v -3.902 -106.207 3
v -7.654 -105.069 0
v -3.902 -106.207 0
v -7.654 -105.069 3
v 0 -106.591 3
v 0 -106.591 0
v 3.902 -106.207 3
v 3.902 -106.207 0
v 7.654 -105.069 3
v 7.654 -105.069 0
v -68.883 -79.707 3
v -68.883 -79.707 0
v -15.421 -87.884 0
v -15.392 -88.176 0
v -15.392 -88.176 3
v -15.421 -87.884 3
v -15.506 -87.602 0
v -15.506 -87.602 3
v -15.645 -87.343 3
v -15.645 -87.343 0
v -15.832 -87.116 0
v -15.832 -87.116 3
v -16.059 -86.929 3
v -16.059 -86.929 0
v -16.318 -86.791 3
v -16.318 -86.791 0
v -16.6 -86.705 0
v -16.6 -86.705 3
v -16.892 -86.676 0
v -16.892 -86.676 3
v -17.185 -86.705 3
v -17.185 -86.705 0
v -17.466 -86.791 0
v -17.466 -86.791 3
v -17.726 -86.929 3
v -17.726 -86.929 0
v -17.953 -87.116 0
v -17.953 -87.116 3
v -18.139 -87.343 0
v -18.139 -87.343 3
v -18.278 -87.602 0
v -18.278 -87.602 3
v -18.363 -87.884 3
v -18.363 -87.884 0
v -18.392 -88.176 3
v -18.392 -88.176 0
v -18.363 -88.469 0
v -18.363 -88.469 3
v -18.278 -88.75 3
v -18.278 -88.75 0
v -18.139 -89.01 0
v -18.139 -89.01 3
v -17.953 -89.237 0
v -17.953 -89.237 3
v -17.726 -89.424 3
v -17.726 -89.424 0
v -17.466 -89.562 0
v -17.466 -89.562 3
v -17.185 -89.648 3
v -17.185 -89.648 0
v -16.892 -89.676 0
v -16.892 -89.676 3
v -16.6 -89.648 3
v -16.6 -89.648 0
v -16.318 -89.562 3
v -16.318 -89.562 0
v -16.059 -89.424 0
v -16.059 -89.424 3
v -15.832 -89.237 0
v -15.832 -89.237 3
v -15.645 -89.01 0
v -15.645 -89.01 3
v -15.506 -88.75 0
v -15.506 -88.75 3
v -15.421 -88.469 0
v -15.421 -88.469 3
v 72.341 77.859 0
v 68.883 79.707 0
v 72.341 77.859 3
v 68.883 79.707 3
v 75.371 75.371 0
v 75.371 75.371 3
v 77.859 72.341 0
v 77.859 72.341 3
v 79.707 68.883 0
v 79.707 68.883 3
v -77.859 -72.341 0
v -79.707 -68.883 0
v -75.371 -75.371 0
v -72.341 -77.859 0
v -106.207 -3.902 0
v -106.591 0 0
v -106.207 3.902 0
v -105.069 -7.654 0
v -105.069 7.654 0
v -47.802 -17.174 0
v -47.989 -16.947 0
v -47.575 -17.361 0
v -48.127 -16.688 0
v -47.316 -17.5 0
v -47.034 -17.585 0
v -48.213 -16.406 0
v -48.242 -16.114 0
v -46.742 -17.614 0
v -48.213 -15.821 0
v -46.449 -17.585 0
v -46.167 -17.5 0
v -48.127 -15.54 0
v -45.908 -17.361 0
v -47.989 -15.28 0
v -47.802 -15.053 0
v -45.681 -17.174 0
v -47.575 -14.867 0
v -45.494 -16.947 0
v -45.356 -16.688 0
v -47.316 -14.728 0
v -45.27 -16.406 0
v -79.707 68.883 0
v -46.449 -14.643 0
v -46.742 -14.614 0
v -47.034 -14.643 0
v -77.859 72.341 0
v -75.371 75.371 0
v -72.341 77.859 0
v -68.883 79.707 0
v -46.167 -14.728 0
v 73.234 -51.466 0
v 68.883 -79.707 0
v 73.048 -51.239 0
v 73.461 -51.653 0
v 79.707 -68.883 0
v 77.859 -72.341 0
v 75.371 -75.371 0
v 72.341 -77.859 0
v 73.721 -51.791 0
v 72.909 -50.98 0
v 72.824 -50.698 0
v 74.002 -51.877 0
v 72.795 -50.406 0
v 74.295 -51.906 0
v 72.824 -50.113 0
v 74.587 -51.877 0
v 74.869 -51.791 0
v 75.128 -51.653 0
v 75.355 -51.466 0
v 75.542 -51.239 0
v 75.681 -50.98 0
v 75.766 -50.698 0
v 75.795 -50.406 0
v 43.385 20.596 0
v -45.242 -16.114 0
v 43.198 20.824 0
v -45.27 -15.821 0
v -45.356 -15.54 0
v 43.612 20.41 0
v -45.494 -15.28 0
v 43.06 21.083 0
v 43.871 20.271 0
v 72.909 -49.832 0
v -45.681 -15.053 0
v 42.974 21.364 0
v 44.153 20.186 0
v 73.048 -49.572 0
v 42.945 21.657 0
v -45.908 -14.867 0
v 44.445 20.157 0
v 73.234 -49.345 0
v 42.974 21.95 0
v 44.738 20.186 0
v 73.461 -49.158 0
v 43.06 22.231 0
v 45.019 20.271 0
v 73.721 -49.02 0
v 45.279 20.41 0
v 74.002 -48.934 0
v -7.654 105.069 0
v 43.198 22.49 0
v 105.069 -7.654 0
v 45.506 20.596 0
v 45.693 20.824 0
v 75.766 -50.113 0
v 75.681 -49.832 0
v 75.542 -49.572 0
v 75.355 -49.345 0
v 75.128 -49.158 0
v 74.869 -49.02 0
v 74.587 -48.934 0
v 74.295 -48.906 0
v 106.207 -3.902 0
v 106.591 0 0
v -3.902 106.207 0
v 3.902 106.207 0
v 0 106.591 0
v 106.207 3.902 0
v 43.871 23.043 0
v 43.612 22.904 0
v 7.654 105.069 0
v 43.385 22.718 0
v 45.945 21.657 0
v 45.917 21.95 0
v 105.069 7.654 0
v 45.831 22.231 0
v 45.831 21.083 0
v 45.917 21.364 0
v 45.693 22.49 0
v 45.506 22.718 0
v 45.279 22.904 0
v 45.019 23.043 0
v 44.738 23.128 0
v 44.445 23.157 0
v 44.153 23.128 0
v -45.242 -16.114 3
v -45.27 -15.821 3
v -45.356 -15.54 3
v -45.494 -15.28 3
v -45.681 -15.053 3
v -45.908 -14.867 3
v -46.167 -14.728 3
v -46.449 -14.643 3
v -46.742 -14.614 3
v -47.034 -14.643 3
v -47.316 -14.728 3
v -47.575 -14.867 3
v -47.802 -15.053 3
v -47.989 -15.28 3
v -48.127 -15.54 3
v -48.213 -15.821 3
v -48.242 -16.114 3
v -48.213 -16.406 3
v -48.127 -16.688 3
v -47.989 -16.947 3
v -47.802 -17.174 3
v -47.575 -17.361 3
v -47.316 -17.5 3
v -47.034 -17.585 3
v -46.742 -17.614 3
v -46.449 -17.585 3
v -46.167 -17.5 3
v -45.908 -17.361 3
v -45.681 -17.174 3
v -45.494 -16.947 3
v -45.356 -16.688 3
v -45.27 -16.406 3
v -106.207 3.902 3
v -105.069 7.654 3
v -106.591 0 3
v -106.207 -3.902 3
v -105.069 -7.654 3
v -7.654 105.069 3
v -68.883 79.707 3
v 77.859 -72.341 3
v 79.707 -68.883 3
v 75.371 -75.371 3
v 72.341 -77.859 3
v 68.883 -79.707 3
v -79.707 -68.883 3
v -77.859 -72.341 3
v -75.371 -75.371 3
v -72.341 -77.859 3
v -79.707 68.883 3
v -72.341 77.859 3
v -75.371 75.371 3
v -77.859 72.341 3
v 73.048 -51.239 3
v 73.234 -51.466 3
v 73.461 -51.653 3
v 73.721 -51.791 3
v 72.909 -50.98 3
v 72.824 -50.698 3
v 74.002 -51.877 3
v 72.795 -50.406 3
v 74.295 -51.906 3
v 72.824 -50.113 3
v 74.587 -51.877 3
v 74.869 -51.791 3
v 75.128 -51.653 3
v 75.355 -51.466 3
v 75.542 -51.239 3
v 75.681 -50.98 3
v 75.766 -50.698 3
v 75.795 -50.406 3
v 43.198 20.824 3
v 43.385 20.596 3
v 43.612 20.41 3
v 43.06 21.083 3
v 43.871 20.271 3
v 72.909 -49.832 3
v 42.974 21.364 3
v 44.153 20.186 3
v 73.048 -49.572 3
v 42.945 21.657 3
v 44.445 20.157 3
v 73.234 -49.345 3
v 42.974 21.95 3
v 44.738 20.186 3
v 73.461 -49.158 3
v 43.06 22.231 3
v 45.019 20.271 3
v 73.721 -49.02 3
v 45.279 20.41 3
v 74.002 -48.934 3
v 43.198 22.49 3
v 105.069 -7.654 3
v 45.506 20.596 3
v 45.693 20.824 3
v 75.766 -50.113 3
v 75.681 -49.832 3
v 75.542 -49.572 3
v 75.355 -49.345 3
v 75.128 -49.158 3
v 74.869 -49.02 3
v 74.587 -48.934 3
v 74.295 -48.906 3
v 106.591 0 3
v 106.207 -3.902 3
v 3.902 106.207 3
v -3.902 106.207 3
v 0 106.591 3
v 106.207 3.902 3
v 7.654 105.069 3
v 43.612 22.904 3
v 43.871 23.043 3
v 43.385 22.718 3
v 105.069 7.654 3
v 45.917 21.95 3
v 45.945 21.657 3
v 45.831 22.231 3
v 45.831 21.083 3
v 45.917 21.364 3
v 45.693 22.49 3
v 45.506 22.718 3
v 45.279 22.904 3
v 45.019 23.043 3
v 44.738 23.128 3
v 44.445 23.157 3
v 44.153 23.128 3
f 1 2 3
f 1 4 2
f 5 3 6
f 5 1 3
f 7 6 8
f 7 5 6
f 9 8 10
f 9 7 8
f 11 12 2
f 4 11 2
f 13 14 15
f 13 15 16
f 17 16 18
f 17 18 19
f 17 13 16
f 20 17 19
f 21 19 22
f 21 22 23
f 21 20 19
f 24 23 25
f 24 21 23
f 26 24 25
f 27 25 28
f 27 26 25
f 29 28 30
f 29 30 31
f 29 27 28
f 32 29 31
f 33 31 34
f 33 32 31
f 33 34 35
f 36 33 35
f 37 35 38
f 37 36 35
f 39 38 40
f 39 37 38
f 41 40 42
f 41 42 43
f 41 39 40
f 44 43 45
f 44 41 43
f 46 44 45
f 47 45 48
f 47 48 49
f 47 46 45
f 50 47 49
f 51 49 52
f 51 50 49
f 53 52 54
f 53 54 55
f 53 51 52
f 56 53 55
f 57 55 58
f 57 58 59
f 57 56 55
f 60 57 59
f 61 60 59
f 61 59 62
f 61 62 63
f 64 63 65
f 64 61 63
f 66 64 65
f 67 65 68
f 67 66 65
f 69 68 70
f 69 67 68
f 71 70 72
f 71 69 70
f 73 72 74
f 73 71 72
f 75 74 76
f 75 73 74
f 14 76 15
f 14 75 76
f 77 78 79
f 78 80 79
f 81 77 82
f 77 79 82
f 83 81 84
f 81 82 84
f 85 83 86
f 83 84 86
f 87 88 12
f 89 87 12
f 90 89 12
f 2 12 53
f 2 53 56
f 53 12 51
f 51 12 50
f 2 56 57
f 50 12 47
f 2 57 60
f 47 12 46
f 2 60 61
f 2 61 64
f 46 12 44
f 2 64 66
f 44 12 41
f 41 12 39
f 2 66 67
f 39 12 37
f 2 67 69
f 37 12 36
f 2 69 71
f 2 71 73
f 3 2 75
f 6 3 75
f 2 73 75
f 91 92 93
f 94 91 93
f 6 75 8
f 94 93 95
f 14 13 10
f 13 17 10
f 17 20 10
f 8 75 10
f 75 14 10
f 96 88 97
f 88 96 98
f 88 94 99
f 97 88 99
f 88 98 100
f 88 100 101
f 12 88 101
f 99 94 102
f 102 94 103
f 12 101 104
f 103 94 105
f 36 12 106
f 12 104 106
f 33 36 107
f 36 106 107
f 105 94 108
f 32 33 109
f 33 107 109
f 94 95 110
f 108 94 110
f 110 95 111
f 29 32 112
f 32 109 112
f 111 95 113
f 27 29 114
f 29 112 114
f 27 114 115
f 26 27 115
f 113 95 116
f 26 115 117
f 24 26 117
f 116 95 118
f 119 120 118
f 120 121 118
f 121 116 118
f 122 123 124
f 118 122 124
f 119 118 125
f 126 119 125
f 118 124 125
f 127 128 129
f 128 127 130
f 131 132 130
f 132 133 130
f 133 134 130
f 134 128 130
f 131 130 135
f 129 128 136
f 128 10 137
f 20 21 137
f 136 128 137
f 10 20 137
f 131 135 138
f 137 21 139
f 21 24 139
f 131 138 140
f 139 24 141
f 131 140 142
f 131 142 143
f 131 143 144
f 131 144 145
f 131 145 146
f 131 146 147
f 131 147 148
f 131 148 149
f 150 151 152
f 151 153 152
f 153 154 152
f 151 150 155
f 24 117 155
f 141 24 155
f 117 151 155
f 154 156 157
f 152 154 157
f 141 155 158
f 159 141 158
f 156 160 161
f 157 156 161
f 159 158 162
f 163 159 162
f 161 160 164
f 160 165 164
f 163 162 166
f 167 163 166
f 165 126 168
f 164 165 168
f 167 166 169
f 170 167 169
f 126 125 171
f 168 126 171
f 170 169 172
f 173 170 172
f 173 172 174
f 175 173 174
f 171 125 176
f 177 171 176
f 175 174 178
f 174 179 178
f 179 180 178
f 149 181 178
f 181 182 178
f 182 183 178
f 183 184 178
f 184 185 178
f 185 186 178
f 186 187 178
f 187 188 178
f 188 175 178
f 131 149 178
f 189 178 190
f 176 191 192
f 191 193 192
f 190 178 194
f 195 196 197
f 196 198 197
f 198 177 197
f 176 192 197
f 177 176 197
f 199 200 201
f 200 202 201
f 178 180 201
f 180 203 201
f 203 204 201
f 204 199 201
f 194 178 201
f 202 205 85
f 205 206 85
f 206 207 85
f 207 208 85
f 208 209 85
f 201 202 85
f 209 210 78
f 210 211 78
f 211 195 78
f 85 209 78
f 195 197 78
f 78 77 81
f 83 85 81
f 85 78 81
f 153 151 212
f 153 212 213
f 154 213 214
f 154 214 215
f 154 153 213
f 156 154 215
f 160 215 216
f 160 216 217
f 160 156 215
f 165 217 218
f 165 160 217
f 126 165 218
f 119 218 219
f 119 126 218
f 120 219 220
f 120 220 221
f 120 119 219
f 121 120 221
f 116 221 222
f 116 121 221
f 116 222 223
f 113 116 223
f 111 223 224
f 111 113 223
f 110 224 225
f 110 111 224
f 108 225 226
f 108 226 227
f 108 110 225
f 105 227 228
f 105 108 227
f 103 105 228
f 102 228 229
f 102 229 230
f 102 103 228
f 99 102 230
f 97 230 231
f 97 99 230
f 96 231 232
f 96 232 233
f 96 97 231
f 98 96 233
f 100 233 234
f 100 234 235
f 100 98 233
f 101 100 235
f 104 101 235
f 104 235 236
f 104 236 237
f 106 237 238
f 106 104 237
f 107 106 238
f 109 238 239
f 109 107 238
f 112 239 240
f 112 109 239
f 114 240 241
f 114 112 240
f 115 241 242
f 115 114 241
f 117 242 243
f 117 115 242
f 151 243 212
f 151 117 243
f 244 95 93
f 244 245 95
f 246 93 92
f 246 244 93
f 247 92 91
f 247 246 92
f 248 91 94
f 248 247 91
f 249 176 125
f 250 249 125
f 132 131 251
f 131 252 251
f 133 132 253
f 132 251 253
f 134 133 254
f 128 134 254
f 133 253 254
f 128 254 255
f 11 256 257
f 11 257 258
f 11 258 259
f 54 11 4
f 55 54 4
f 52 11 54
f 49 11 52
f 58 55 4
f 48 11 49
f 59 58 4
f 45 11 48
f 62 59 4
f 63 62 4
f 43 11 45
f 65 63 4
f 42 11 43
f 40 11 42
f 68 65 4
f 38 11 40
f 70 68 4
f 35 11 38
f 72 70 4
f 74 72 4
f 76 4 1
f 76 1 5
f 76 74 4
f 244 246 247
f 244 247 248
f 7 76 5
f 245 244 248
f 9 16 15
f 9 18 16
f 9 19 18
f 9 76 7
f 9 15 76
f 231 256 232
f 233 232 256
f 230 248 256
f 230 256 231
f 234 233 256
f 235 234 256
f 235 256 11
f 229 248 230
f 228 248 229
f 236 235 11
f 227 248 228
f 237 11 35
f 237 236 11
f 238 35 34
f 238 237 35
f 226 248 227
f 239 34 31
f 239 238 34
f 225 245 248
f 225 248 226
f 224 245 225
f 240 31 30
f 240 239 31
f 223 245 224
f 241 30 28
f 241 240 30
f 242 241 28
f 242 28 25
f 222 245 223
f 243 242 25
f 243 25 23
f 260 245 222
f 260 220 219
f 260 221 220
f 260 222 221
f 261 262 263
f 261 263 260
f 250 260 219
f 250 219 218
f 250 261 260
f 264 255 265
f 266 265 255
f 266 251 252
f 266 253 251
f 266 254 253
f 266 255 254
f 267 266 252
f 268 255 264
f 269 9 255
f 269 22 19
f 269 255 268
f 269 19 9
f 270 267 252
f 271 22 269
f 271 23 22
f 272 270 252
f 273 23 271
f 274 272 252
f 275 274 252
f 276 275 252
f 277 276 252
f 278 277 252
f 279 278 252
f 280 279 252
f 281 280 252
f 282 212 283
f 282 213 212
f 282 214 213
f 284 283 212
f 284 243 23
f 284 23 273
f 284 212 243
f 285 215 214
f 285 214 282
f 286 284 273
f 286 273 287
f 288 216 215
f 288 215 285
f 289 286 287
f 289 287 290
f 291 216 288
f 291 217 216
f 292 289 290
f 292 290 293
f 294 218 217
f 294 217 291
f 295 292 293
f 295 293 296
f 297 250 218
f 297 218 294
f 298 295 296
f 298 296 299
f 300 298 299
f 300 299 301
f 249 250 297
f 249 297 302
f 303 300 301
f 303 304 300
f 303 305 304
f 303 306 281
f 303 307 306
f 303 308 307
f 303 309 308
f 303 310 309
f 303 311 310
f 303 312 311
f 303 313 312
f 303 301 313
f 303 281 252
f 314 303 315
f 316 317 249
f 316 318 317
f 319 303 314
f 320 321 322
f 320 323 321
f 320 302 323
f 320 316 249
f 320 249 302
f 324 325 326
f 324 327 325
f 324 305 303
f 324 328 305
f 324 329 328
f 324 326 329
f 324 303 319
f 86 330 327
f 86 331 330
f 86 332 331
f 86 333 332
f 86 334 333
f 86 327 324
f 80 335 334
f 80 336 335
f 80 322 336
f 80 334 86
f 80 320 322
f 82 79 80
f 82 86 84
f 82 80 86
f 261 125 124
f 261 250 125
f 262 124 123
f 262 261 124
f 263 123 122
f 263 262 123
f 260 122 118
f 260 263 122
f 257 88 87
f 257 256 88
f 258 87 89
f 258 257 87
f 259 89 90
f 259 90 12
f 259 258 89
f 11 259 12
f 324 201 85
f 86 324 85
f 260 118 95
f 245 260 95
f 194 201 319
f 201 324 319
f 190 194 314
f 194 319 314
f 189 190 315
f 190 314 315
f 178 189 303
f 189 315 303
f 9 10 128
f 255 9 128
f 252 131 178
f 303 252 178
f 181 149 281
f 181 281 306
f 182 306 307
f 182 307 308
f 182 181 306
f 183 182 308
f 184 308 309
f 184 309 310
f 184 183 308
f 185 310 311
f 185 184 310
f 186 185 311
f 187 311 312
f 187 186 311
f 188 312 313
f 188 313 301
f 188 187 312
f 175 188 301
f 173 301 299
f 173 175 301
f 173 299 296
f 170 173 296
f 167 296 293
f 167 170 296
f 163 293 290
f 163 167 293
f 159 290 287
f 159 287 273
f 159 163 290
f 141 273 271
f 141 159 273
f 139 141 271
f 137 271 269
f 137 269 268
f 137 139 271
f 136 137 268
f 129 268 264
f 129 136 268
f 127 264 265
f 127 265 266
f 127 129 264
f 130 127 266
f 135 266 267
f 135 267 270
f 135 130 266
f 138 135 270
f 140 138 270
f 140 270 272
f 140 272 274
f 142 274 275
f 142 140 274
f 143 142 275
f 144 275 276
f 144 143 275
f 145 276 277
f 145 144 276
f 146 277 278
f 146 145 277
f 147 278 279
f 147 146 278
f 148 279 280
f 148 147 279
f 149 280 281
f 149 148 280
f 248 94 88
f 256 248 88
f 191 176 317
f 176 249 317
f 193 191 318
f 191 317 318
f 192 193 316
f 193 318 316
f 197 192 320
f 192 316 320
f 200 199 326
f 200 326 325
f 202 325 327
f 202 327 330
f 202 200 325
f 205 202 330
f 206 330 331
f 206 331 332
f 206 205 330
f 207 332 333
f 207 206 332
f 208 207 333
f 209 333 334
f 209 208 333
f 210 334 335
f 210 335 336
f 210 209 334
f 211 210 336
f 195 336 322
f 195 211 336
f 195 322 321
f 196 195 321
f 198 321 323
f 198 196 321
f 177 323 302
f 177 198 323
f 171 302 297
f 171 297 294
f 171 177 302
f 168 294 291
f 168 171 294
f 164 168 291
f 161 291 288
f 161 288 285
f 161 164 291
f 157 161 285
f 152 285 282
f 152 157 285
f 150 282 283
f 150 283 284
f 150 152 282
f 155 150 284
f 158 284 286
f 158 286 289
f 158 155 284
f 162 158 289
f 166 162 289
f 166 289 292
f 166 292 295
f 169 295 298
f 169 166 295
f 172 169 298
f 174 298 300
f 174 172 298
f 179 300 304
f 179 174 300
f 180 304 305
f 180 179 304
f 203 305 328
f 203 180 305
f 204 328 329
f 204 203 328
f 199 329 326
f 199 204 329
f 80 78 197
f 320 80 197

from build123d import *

# Parameters (mm, degrees)
SKETCH_1_R      = 1.5
EXTRUDE_1_DEPTH = 3
FILLET_1_R      = 20


with BuildPart() as part:
    # 草图1 → 凸台-拉伸1 (new body)
    with BuildSketch(Plane.XY):
        Polygon((0, 108.239220029), (-76.536686473, 76.536686473), (-108.239220029, 0), (-76.536686473, -76.536686473), (0, -108.239220029), (76.536686473, -76.536686473), (108.239220029, 0), (76.536686473, 76.536686473), align=None)
        with Locations((-46.741505227, -16.11378879)):
            Circle(SKETCH_1_R, mode=Mode.SUBTRACT)
        with Locations((-16.892197502, -88.176392326)):
            Circle(SKETCH_1_R, mode=Mode.SUBTRACT)
        with Locations((74.294712357, -50.405537551)):
            Circle(SKETCH_1_R, mode=Mode.SUBTRACT)
        with Locations((44.445404632, 21.657065985)):
            Circle(SKETCH_1_R, mode=Mode.SUBTRACT)
    extrude(amount=EXTRUDE_1_DEPTH)

    # 圆角1
    fillet_1_edges = [part.edges().sort_by_distance(p)[0] for p in [
        (76.536686473, 76.536686473, 1.5),
        (108.239220029, 0, 1.5),
        (76.536686473, -76.536686473, 1.5),
        (0, -108.239220029, 1.5),
        (-76.536686473, -76.536686473, 1.5),
        (-108.239220029, 0, 1.5),
        (-76.536686473, 76.536686473, 1.5),
        (0, 108.239220029, 1.5),
    ]]
    fillet(fillet_1_edges, radius=FILLET_1_R)


solid = part.part
